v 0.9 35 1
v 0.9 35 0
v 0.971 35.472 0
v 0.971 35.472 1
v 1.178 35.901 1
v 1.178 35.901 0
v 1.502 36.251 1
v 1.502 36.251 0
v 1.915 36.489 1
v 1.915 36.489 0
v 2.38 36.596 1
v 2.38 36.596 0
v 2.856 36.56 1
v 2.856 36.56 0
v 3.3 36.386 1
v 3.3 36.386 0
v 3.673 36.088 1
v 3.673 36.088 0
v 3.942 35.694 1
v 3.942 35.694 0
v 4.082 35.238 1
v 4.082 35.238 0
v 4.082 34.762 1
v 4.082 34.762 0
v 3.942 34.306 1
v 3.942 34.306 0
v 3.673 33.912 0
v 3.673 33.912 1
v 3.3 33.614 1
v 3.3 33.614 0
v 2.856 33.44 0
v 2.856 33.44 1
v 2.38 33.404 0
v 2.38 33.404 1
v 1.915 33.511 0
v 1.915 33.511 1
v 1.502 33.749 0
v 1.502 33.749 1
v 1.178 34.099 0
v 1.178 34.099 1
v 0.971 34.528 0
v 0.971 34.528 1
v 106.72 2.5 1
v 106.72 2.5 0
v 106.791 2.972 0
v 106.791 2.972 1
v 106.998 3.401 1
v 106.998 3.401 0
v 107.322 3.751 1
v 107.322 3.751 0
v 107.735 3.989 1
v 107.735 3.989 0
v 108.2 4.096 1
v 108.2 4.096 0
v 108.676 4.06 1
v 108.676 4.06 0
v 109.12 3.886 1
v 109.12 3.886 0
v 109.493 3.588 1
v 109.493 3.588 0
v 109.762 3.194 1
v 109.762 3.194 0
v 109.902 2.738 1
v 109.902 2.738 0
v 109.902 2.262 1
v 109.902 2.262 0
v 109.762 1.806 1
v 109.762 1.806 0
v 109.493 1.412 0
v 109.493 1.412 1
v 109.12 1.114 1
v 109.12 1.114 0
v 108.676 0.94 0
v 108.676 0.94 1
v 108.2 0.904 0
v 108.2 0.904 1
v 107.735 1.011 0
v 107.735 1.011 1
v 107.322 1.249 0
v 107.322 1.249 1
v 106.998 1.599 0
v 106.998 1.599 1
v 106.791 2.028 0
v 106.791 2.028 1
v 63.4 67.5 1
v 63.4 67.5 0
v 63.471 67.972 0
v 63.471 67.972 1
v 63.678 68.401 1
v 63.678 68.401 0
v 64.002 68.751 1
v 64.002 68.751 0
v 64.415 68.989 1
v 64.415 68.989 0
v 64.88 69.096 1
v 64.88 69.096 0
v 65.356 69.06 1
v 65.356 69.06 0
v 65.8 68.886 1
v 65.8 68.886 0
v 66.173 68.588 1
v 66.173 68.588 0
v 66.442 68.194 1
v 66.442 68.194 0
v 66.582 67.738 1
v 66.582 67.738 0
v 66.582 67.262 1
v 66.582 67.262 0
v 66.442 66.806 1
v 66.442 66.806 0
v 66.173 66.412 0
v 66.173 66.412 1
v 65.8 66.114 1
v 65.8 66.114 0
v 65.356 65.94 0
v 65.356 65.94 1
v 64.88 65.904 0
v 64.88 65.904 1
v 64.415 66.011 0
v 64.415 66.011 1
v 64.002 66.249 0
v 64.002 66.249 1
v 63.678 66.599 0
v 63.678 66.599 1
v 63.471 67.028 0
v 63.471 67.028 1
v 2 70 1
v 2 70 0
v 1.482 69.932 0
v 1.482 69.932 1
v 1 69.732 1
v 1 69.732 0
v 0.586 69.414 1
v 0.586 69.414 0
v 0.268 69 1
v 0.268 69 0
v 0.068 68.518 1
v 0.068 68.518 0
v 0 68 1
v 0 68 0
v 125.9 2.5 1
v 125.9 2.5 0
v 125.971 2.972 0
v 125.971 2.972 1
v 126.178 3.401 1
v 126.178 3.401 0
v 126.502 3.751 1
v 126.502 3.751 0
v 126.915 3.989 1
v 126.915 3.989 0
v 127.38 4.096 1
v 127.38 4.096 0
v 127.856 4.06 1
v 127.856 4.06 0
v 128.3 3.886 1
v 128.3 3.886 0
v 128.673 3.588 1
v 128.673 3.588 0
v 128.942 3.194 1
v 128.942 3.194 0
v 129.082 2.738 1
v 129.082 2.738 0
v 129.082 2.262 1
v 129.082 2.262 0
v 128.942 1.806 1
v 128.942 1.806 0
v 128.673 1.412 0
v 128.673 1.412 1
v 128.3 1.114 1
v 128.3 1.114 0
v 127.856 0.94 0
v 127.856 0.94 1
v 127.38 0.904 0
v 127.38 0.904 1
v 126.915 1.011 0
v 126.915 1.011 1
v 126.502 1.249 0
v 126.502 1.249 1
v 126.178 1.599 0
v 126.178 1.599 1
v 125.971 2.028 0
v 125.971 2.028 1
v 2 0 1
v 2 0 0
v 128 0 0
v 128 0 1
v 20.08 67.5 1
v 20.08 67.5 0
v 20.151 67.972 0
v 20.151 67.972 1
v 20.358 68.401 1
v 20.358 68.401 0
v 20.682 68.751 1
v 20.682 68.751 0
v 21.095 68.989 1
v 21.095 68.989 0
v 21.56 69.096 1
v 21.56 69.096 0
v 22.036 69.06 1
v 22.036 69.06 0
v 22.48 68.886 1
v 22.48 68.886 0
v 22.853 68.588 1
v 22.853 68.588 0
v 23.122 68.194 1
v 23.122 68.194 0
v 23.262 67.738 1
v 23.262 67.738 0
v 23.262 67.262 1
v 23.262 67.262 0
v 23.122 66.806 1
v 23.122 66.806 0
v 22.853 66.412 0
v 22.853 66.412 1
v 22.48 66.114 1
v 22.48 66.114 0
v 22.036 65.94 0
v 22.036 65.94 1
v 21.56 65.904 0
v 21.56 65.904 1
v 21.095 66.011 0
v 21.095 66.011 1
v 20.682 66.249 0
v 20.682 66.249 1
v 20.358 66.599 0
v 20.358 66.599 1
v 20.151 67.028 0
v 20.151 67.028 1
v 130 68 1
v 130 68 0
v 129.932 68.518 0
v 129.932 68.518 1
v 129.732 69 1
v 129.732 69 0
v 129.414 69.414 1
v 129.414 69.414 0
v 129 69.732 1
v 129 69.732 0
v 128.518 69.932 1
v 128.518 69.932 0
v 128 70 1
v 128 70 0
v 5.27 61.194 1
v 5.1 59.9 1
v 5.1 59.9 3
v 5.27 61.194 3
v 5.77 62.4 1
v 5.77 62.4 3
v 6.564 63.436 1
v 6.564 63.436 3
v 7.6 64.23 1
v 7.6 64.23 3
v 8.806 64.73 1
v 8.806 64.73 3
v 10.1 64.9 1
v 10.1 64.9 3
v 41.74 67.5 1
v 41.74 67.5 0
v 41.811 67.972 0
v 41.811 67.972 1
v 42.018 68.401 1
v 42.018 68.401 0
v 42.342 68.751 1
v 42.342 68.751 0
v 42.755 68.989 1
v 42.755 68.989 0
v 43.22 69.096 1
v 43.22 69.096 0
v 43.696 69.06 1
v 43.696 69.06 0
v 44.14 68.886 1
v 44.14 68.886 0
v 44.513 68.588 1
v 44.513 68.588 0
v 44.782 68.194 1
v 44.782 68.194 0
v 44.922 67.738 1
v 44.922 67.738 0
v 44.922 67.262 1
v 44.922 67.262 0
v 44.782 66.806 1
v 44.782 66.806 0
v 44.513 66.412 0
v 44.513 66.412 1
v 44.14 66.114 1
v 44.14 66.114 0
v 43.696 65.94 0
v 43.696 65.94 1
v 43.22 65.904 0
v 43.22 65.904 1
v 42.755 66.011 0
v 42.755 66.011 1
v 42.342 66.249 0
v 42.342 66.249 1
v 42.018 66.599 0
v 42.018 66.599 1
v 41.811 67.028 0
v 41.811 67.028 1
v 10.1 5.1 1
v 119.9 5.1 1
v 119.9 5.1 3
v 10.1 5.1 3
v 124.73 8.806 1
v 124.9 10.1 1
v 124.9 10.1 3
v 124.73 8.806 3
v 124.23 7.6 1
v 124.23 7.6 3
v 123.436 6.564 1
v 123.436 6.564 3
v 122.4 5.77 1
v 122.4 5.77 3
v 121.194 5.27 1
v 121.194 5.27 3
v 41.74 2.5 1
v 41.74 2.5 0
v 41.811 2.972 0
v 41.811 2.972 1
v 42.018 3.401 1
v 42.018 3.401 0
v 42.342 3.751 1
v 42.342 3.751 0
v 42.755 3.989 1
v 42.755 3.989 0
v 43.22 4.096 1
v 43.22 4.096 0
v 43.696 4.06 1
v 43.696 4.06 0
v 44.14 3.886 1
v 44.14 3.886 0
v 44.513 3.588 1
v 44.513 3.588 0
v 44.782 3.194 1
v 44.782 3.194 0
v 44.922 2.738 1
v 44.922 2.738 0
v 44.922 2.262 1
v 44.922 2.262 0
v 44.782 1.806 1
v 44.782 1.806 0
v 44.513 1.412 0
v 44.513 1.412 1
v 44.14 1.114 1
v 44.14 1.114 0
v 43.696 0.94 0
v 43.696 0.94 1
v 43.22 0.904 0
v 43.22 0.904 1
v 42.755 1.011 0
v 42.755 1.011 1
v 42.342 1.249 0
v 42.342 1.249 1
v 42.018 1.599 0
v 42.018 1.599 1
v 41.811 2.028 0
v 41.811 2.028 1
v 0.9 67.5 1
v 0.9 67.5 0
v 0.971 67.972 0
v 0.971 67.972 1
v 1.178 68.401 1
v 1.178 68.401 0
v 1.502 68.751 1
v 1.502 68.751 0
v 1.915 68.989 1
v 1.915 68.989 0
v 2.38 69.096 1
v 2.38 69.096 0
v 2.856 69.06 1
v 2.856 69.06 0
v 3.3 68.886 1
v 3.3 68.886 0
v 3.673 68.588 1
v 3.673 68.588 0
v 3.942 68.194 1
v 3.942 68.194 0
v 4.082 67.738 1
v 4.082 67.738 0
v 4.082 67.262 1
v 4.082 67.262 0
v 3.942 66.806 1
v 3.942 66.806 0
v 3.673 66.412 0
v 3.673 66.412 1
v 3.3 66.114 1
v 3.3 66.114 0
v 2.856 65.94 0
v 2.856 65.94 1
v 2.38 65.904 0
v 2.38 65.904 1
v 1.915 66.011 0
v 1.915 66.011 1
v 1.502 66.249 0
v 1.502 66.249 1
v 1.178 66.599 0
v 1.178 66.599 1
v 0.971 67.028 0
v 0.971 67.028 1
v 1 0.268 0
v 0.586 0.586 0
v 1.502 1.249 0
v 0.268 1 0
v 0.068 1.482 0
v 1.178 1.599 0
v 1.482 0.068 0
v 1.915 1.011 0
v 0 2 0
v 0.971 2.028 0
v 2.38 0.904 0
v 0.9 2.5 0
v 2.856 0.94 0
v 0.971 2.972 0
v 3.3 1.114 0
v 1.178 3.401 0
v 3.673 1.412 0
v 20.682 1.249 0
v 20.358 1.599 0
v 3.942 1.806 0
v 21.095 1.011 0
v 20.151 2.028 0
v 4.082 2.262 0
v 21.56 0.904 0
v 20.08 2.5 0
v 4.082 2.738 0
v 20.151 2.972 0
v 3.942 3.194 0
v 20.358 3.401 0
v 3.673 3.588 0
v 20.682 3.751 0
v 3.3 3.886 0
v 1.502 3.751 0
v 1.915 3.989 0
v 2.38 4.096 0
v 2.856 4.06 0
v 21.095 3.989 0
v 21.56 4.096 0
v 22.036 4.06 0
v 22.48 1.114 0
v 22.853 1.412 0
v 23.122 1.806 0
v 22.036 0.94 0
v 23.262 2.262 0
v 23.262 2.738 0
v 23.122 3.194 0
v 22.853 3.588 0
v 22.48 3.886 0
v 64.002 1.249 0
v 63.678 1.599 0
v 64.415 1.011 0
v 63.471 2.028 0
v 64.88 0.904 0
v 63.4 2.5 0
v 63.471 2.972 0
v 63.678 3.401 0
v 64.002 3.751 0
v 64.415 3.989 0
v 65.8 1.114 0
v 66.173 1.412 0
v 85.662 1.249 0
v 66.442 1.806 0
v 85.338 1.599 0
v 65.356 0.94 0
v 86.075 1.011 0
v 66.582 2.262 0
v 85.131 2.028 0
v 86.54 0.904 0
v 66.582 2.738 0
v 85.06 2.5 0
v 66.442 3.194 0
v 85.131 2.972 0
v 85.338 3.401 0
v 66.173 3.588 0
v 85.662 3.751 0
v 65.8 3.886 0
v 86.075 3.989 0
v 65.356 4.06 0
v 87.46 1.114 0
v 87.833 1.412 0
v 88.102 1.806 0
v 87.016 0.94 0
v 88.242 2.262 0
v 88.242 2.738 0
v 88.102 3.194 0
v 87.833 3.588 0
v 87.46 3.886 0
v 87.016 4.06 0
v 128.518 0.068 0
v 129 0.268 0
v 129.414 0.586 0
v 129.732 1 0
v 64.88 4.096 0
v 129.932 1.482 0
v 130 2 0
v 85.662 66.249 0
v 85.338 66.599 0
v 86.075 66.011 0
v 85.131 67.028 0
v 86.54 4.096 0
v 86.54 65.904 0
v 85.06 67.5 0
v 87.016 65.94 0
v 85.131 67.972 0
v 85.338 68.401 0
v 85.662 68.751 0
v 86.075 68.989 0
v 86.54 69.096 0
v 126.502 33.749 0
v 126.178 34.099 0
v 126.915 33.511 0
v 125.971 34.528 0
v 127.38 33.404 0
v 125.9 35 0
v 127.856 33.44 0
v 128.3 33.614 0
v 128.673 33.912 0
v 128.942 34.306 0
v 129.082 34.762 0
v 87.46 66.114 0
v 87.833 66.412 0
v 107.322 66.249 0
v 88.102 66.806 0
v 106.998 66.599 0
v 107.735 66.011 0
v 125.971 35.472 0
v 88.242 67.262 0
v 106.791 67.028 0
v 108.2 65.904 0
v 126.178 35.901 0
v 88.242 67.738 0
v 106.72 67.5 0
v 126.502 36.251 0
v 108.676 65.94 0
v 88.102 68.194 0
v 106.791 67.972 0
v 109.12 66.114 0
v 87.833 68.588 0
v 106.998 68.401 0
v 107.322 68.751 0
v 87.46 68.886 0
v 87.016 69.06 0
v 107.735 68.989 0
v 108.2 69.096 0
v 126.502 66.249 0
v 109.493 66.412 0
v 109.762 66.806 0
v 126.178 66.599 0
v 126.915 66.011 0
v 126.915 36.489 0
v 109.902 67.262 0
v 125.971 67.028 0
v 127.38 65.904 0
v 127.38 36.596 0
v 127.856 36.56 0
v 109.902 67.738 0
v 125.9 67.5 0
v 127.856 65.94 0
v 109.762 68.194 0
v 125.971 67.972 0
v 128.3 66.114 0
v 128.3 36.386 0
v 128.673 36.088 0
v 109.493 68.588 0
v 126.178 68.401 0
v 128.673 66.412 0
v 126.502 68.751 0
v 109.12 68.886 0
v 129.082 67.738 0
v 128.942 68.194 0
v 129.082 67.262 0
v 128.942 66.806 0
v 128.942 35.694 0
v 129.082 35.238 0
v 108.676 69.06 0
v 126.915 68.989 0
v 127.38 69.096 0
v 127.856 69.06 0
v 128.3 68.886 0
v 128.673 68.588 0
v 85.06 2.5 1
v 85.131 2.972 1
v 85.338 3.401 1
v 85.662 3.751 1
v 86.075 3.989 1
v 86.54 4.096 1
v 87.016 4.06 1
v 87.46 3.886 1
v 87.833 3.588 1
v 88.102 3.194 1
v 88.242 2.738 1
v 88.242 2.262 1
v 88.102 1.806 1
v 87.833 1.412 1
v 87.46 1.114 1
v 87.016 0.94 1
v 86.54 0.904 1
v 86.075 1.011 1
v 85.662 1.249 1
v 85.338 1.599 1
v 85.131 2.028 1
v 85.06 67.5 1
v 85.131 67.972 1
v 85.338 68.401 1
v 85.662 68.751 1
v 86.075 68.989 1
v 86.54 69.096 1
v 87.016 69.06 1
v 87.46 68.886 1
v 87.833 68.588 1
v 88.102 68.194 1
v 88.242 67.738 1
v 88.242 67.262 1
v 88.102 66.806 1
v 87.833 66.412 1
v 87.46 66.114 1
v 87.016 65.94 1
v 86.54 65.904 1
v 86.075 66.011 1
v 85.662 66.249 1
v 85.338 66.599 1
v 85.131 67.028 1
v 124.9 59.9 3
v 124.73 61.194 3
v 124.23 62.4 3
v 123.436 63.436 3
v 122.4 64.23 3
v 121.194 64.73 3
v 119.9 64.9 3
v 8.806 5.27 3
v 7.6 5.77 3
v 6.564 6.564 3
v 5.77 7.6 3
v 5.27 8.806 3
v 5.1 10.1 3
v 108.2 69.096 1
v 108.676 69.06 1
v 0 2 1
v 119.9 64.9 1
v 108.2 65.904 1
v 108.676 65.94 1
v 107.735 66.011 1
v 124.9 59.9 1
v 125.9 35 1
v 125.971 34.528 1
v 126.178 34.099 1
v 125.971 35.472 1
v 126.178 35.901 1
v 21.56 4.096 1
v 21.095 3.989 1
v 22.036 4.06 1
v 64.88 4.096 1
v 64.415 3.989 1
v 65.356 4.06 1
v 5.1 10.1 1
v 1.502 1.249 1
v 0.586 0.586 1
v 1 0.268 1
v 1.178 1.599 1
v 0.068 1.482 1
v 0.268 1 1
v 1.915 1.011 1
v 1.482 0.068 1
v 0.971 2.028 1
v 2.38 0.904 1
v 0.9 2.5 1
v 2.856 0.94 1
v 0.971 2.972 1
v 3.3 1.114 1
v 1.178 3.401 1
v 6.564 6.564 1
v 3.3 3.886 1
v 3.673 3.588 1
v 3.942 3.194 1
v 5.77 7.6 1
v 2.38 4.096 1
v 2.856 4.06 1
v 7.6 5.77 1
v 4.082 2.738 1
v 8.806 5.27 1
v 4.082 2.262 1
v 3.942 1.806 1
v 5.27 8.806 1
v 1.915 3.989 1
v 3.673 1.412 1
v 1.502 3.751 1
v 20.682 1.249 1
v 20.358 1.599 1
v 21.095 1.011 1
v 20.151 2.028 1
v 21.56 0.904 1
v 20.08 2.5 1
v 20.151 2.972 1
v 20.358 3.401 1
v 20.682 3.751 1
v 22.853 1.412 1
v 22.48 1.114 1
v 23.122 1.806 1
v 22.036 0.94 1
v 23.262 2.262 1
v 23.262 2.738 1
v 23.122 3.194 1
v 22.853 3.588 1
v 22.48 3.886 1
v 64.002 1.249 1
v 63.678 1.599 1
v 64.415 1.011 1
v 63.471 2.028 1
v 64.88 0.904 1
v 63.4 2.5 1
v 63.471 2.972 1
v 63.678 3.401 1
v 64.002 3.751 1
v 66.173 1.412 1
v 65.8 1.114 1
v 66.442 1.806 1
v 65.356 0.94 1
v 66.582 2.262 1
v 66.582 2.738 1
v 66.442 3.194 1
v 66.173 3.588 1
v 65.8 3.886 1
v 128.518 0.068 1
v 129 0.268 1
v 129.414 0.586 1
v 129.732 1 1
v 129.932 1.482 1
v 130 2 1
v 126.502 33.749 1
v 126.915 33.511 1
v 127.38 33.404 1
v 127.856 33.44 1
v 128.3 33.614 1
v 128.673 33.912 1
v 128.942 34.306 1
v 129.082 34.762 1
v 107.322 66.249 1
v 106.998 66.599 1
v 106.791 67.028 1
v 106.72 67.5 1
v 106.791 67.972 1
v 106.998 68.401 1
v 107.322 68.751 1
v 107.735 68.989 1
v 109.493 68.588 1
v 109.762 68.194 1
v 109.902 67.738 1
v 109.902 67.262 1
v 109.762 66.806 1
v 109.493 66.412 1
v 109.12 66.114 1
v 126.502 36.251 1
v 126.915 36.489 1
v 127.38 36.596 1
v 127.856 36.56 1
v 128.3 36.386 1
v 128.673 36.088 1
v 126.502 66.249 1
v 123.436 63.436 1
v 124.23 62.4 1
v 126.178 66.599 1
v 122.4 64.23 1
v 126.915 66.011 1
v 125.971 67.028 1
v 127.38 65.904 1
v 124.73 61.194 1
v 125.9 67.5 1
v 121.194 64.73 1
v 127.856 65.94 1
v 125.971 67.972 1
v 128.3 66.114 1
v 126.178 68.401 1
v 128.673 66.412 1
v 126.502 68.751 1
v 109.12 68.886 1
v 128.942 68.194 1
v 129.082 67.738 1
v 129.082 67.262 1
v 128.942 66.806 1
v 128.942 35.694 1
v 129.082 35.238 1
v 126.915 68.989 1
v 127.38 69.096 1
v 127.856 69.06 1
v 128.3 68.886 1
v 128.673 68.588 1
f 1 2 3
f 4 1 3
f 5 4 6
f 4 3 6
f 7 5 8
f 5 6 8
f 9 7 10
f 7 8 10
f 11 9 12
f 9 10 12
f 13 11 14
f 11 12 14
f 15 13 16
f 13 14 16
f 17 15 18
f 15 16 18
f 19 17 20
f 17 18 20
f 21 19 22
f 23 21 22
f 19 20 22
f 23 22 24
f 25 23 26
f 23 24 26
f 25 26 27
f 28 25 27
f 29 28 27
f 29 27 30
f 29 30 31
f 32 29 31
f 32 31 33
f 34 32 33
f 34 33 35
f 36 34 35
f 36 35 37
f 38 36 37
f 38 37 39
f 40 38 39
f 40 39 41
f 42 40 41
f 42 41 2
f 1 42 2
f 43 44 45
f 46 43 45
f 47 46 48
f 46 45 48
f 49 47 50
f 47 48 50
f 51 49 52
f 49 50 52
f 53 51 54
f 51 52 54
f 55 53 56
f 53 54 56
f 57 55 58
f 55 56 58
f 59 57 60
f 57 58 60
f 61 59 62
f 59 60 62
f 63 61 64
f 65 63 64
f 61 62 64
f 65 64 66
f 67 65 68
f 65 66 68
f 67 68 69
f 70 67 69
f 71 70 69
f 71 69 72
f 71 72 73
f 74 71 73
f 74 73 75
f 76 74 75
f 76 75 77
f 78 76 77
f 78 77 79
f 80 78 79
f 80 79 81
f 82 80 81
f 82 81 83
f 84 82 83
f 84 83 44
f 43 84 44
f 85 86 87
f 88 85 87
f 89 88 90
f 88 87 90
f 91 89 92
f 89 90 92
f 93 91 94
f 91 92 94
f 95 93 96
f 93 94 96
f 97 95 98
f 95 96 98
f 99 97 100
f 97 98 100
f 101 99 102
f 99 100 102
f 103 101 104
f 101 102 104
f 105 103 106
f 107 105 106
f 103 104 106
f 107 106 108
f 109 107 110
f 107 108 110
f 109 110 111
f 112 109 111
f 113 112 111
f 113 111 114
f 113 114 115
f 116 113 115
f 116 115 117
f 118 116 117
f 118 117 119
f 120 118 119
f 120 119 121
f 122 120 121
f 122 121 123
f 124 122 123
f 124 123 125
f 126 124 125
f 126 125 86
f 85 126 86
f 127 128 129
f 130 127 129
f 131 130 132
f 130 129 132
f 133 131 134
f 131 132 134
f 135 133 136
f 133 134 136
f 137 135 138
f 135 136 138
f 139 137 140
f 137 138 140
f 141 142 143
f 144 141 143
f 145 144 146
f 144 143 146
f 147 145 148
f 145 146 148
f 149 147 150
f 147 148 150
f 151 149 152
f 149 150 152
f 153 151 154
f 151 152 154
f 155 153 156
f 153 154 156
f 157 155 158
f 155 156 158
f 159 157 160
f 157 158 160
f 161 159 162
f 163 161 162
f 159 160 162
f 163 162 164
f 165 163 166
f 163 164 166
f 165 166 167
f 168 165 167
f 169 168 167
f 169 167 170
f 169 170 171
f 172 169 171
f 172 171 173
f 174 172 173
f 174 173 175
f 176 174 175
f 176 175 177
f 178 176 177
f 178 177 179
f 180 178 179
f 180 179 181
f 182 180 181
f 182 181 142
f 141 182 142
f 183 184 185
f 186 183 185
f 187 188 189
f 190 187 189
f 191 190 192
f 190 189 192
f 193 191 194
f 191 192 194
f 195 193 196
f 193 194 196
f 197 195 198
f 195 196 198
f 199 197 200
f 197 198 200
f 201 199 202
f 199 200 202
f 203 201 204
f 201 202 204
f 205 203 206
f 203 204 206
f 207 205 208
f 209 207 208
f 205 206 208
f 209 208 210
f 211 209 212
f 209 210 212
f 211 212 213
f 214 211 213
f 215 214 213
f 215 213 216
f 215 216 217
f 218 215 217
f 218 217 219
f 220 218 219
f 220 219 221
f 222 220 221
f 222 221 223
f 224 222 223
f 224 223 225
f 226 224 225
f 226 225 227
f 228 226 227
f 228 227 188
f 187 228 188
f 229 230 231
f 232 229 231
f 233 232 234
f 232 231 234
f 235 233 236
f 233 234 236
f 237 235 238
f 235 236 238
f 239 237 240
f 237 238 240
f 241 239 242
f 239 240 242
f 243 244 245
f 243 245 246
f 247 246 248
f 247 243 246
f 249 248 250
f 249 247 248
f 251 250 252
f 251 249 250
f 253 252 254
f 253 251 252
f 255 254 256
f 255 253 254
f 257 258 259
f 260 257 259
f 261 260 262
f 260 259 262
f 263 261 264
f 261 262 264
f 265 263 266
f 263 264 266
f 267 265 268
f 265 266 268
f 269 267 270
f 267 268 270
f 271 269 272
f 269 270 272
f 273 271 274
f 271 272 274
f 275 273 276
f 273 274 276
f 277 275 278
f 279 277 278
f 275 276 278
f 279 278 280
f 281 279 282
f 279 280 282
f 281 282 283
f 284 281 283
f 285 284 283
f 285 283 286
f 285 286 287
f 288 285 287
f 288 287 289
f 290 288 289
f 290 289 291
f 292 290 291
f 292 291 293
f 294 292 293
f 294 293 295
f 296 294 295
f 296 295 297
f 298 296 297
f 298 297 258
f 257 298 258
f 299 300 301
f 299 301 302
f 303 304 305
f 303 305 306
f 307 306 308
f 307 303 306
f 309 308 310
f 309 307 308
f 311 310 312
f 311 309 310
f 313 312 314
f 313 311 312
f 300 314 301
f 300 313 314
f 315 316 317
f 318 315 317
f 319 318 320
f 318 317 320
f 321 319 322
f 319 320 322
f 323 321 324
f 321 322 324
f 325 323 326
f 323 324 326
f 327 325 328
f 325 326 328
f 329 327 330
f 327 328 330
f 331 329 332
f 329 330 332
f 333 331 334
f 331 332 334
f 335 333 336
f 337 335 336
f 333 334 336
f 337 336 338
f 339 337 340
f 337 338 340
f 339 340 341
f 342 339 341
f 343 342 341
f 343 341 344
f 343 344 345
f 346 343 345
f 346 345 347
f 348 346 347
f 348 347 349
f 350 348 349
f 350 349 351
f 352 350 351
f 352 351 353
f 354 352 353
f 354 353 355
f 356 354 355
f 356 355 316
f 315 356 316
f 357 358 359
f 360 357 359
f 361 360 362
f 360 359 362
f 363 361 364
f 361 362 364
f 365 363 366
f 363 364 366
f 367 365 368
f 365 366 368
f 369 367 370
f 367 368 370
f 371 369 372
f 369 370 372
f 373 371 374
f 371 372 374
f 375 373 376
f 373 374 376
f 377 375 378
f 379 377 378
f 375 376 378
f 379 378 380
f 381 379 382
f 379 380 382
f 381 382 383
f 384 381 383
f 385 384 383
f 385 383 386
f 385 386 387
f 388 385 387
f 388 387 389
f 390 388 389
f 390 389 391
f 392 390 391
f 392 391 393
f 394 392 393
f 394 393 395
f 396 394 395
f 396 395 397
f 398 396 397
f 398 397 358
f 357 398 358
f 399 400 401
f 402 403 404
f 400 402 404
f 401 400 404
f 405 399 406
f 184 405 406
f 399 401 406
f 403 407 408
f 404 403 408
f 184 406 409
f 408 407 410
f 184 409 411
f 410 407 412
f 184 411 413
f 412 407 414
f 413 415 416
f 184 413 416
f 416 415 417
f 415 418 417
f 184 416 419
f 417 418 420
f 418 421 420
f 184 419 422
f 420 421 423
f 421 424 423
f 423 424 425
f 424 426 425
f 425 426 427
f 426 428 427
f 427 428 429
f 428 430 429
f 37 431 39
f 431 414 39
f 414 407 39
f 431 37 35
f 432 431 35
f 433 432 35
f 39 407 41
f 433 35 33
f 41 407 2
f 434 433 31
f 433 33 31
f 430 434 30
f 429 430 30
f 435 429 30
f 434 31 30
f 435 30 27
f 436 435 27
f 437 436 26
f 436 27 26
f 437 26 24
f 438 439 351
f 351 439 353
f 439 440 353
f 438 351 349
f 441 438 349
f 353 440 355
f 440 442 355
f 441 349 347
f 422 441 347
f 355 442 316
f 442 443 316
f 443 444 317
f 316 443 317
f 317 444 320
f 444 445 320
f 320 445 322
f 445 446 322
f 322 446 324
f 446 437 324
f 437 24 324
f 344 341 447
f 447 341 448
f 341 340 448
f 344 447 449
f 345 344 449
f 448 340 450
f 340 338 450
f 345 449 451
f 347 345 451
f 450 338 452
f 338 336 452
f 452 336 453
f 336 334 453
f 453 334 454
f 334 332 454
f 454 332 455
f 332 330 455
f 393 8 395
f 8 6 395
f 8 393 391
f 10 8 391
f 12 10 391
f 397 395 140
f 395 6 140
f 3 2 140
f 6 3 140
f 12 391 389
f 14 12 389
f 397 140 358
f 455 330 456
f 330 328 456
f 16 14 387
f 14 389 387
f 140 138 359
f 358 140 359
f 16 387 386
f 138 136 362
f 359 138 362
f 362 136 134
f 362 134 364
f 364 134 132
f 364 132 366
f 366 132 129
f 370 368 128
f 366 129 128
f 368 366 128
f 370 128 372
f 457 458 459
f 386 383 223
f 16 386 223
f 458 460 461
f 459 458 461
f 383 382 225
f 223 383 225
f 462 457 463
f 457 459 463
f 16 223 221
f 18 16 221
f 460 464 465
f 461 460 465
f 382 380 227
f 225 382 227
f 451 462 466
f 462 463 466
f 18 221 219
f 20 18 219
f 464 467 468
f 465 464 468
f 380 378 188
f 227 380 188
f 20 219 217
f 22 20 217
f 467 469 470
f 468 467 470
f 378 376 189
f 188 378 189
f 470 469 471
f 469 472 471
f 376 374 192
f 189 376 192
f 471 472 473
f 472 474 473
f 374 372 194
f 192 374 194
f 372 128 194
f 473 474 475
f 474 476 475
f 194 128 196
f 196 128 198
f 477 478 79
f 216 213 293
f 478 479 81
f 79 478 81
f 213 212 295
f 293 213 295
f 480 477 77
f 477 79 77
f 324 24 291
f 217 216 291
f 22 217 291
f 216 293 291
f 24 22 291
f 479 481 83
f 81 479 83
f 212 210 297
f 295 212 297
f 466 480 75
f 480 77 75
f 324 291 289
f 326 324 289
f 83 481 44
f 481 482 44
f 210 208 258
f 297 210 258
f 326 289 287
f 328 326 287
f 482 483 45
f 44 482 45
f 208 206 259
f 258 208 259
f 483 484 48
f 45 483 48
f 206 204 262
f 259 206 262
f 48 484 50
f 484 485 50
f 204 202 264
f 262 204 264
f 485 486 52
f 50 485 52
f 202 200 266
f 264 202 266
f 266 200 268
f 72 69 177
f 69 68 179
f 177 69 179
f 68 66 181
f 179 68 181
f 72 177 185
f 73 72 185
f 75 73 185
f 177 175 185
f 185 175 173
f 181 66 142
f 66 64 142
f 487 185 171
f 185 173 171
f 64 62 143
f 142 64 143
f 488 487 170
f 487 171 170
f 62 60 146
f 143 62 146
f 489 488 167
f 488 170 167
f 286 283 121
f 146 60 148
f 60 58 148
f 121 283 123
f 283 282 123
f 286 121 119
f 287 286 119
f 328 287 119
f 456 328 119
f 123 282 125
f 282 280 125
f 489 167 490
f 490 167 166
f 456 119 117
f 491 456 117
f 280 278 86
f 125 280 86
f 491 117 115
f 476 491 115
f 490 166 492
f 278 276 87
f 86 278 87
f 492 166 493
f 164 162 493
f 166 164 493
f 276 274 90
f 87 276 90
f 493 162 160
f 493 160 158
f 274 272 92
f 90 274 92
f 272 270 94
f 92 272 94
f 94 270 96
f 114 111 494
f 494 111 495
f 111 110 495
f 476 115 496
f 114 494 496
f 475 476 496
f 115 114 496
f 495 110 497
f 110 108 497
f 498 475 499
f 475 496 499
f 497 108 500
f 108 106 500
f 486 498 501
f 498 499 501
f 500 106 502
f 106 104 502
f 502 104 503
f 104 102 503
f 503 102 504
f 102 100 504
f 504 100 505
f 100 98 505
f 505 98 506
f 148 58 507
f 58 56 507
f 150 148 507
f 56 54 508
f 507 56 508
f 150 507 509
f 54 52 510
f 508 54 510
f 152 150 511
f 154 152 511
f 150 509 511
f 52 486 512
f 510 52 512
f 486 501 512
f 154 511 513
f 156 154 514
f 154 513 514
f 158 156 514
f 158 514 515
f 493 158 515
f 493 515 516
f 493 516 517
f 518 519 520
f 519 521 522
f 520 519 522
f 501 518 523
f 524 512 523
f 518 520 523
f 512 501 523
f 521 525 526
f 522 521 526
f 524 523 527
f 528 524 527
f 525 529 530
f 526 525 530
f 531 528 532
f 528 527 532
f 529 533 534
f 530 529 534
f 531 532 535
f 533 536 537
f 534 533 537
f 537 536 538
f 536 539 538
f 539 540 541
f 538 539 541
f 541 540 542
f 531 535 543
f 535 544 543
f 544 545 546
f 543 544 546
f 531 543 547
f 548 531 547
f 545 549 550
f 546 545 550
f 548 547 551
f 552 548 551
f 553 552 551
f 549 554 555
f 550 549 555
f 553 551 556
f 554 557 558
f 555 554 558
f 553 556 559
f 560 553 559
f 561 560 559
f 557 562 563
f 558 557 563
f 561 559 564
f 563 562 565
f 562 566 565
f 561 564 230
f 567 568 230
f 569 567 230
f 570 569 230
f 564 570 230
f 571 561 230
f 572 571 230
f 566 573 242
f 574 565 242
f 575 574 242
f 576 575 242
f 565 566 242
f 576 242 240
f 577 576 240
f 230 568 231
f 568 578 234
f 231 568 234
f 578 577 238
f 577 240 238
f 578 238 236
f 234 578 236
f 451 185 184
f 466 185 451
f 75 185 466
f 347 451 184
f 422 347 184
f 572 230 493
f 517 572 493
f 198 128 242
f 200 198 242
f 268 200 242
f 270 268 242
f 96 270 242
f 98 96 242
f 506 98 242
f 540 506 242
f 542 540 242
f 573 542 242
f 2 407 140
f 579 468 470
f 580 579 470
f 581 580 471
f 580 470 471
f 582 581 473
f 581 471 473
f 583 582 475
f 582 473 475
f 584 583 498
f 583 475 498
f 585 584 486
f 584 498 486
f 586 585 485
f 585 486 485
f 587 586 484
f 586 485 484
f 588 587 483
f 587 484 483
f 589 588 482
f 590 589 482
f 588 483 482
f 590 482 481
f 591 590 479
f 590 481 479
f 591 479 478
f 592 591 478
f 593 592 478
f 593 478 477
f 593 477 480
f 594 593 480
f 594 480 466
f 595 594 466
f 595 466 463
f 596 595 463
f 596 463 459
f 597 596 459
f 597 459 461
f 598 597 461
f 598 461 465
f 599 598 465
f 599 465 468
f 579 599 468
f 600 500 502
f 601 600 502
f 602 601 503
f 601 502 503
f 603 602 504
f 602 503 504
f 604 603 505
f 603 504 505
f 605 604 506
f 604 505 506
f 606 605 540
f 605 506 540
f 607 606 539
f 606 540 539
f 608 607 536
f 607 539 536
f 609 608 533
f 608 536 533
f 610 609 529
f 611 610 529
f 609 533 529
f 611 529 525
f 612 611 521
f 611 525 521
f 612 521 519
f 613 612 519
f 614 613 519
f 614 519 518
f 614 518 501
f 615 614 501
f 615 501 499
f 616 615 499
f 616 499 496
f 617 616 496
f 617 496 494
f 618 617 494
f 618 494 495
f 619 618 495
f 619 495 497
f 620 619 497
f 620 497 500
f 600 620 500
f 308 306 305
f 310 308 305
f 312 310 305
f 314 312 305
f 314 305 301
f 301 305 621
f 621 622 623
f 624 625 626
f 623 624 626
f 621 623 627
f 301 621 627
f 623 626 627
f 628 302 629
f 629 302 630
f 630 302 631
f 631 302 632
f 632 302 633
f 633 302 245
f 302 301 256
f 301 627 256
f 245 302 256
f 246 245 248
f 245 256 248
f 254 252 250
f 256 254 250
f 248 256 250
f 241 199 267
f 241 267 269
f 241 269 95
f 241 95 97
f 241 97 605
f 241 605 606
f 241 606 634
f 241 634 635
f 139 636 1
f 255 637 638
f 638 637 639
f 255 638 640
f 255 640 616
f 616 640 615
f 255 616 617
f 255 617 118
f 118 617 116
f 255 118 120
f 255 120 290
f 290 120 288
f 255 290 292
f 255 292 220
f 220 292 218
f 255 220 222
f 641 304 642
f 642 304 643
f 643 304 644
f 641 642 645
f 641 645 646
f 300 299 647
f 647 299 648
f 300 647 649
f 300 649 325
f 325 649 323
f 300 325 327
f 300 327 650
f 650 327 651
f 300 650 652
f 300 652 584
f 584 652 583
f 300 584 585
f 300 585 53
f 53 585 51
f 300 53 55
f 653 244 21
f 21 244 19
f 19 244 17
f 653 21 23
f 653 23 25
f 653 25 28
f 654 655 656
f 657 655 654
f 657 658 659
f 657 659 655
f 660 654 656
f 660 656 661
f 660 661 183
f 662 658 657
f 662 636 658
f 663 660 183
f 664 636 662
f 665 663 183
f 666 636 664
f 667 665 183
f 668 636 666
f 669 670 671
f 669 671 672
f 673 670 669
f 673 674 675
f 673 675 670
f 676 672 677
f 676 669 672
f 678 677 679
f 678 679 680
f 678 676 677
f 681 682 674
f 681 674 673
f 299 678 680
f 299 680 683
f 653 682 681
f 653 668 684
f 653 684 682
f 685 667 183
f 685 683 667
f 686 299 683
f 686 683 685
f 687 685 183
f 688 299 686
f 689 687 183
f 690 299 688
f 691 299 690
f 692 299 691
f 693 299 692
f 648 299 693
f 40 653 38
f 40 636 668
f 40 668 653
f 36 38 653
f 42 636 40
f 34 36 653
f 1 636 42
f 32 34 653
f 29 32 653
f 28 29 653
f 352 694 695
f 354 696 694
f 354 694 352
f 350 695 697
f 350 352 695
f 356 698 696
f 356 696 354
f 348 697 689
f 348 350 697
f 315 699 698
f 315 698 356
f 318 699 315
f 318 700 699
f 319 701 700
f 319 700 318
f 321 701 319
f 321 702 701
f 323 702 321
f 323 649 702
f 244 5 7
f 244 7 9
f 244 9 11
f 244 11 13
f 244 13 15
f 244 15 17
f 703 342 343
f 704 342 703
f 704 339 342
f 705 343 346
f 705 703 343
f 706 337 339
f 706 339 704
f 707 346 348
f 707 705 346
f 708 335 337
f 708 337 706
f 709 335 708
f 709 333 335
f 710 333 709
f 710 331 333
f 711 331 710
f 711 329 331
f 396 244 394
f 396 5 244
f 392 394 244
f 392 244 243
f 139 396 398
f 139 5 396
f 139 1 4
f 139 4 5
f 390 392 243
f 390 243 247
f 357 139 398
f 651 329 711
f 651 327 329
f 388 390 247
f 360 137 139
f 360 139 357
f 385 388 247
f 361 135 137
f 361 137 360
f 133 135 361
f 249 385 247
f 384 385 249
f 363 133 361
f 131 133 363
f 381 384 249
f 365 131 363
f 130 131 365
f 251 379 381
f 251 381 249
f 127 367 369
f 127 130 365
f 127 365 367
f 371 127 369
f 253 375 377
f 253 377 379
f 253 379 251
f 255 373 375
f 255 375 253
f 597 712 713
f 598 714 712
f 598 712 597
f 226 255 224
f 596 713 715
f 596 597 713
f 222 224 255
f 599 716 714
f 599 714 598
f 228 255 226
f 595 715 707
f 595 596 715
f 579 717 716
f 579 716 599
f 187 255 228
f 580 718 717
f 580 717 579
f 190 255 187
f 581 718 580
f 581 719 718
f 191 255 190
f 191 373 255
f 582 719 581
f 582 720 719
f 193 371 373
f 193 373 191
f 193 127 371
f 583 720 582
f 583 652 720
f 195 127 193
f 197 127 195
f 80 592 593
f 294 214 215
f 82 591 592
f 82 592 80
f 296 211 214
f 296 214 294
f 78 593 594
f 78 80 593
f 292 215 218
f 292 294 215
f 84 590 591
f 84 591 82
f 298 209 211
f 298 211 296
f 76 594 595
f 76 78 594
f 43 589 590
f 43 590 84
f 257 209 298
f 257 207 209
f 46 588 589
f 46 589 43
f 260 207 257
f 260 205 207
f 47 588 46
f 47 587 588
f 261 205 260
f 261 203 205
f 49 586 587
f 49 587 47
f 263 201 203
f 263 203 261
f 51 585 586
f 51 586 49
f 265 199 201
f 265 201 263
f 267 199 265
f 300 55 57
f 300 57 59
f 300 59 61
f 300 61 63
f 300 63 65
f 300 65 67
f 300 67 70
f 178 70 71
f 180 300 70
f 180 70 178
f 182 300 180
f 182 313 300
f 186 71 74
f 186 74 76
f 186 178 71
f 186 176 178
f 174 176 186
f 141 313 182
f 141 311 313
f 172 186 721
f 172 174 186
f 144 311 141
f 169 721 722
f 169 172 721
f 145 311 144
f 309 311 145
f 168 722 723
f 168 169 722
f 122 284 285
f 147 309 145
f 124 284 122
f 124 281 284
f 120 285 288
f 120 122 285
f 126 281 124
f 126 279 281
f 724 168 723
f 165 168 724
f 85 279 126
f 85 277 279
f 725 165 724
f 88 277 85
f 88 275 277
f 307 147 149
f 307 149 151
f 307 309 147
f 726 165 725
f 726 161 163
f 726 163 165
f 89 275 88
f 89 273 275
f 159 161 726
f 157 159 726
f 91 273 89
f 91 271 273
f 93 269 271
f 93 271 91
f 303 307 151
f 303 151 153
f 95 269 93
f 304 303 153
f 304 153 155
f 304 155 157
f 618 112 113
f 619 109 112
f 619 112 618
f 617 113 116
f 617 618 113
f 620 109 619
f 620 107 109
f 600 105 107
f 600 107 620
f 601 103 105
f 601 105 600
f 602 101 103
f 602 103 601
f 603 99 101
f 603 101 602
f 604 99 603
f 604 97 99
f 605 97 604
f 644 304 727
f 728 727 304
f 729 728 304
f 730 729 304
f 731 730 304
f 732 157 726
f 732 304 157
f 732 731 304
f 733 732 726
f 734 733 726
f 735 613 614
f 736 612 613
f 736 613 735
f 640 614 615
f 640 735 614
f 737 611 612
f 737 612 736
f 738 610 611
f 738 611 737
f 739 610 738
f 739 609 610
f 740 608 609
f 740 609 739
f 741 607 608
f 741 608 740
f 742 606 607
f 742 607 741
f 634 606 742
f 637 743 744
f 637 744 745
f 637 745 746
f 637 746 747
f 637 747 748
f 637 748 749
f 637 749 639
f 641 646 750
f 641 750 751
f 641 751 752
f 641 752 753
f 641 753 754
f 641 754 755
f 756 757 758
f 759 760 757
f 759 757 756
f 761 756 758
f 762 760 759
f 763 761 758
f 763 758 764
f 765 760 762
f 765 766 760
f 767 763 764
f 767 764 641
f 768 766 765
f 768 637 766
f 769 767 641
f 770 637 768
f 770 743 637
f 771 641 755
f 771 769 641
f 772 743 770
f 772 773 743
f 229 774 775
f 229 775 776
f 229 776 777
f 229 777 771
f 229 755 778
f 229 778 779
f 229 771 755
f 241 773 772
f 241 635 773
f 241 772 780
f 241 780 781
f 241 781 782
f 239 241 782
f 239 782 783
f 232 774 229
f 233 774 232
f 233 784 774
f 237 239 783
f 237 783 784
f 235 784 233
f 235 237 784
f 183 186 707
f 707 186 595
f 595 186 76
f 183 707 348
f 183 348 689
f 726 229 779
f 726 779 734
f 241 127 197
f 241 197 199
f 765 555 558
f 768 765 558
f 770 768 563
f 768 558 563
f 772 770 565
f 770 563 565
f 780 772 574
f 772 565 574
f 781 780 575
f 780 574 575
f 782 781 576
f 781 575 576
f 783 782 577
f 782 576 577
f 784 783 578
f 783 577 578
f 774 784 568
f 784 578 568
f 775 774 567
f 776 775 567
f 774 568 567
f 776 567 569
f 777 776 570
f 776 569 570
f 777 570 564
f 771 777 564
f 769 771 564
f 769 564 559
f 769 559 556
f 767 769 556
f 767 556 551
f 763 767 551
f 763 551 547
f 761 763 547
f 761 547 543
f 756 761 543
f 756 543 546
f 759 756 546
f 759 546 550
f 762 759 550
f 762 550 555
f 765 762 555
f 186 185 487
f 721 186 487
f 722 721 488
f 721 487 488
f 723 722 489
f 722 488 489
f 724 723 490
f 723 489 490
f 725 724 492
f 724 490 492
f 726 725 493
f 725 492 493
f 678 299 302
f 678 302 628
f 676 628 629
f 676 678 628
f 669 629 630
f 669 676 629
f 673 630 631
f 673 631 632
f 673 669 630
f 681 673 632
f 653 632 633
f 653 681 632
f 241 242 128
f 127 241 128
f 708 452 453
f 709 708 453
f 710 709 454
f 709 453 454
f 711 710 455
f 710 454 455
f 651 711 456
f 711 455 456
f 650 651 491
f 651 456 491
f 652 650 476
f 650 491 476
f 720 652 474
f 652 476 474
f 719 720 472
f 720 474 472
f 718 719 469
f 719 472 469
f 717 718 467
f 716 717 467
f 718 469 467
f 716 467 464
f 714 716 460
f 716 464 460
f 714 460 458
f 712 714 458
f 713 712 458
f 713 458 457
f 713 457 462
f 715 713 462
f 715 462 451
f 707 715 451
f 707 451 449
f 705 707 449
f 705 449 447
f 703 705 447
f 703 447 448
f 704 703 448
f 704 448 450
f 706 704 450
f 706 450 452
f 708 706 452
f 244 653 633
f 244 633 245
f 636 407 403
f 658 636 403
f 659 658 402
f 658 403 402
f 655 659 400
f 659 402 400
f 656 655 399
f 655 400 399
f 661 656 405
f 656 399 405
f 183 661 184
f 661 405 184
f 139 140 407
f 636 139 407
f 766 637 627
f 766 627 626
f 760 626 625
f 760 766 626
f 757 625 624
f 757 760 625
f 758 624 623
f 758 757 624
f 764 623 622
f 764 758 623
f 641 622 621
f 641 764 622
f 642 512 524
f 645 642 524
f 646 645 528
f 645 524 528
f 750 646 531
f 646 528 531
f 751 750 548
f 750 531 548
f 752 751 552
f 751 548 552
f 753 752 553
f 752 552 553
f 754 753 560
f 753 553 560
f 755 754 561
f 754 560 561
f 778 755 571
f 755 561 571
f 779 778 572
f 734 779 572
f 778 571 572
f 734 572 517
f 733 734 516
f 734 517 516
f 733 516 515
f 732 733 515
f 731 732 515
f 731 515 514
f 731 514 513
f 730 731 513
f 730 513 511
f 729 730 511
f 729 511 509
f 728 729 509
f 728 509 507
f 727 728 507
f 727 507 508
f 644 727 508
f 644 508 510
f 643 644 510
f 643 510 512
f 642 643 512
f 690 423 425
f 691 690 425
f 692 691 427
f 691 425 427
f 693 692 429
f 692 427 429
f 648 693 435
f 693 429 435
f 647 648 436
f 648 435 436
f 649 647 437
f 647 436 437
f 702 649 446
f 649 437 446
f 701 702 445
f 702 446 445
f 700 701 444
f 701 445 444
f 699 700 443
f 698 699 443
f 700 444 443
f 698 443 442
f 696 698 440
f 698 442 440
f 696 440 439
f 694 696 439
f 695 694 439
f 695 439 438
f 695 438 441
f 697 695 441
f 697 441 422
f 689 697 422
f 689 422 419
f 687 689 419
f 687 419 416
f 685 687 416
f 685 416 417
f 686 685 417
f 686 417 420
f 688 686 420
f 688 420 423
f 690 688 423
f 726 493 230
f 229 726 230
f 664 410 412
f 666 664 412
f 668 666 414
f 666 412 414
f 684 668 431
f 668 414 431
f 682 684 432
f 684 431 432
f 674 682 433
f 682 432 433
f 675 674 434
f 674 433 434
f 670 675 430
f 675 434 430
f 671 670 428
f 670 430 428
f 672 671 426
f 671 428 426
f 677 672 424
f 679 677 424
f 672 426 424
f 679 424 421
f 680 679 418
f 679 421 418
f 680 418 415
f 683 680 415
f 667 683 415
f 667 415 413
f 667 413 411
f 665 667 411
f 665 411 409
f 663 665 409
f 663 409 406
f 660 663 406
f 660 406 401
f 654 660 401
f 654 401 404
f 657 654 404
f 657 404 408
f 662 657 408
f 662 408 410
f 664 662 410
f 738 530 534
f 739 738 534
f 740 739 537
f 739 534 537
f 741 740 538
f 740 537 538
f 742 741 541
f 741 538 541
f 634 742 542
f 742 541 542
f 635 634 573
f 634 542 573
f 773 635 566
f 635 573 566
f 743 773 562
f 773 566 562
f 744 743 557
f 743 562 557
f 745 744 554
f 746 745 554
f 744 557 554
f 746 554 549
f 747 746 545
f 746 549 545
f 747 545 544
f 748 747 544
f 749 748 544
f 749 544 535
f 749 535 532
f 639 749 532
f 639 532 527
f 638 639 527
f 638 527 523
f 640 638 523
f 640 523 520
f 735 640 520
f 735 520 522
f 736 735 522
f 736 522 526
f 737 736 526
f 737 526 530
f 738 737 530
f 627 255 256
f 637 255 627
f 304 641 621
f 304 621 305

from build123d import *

# Parameters (mm, degrees)
BOSS_EXTRU_1_DEPTH      = 1
BOSS_EXTRU_2_DEPTH      = 2
ENL_V_MAT_EXTRU_1_REACH = 5
ESQUISSE3_R             = 1.6


with BuildPart() as part:
    # Esquisse1 → Boss.-Extru.1 (new body)
    with BuildSketch(Plane.XY):
        with BuildLine():
            Line((2, 0), (128, 0))
            ThreePointArc((128, 0), (129.414213562, 0.585786438), (130, 2))
            Line((130, 2), (130, 68))
            ThreePointArc((130, 68), (129.414213562, 69.414213562), (128, 70))
            Line((128, 70), (2, 70))
            ThreePointArc((2, 70), (0.585786438, 69.414213562), (0, 68))
            Line((0, 68), (0, 2))
            ThreePointArc((0, 2), (0.585786438, 0.585786438), (2, 0))
        make_face()
    extrude(amount=BOSS_EXTRU_1_DEPTH)

    # Esquisse2 → Boss.-Extru.2 (add)
    with BuildSketch(Plane.XY.offset(1)):
        with BuildLine():
            Line((10.1, 64.9), (119.9, 64.9))
            ThreePointArc((119.9, 64.9), (123.435533906, 63.435533906), (124.9, 59.9))
            Line((124.9, 59.9), (124.9, 10.1))
            ThreePointArc((124.9, 10.1), (123.435533906, 6.564466094), (119.9, 5.1))
            Line((119.9, 5.1), (10.1, 5.1))
            ThreePointArc((10.1, 5.1), (6.564466094, 6.564466094), (5.1, 10.1))
            Line((5.1, 10.1), (5.1, 59.9))
            ThreePointArc((5.1, 59.9), (6.564466094, 63.435533906), (10.1, 64.9))
        make_face()
    extrude(amount=BOSS_EXTRU_2_DEPTH)

    # Esquisse3 → Enlèv. mat.-Extru.1 (cut, up to next)
    with BuildSketch(Plane(origin=(0, 0, 0), x_dir=(-1, 0, 0), z_dir=(0, 0, -1)), mode=Mode.PRIVATE) as enl_v_mat_extru_1_sk1:
        with Locations((-65, 67.5)):
            Circle(ESQUISSE3_R)
    enl_v_mat_extru_1_tool1 = extrude(enl_v_mat_extru_1_sk1.sketch, amount=-ENL_V_MAT_EXTRU_1_REACH, mode=Mode.PRIVATE) & part.part
    add(enl_v_mat_extru_1_tool1.solids().sort_by_distance((65, 67.5, 0))[0], mode=Mode.SUBTRACT)
    # Esquisse3 → Enlèv. mat.-Extru.1 (cut, up to next)
    with BuildSketch(Plane(origin=(0, 0, 0), x_dir=(-1, 0, 0), z_dir=(0, 0, -1)), mode=Mode.PRIVATE) as enl_v_mat_extru_1_sk2:
        with Locations((-43.34, 67.5)):
            Circle(ESQUISSE3_R)
    enl_v_mat_extru_1_tool2 = extrude(enl_v_mat_extru_1_sk2.sketch, amount=-ENL_V_MAT_EXTRU_1_REACH, mode=Mode.PRIVATE) & part.part
    add(enl_v_mat_extru_1_tool2.solids().sort_by_distance((43.34, 67.5, 0))[0], mode=Mode.SUBTRACT)
    # Esquisse3 → Enlèv. mat.-Extru.1 (cut, up to next)
    with BuildSketch(Plane(origin=(0, 0, 0), x_dir=(-1, 0, 0), z_dir=(0, 0, -1)), mode=Mode.PRIVATE) as enl_v_mat_extru_1_sk3:
        with Locations((-21.68, 67.5)):
            Circle(ESQUISSE3_R)
    enl_v_mat_extru_1_tool3 = extrude(enl_v_mat_extru_1_sk3.sketch, amount=-ENL_V_MAT_EXTRU_1_REACH, mode=Mode.PRIVATE) & part.part
    add(enl_v_mat_extru_1_tool3.solids().sort_by_distance((21.68, 67.5, 0))[0], mode=Mode.SUBTRACT)
    # Esquisse3 → Enlèv. mat.-Extru.1 (cut, up to next)
    with BuildSketch(Plane(origin=(0, 0, 0), x_dir=(-1, 0, 0), z_dir=(0, 0, -1)), mode=Mode.PRIVATE) as enl_v_mat_extru_1_sk4:
        with Locations((-2.5, 67.5)):
            Circle(ESQUISSE3_R)
    enl_v_mat_extru_1_tool4 = extrude(enl_v_mat_extru_1_sk4.sketch, amount=-ENL_V_MAT_EXTRU_1_REACH, mode=Mode.PRIVATE) & part.part
    add(enl_v_mat_extru_1_tool4.solids().sort_by_distance((2.5, 67.5, 0))[0], mode=Mode.SUBTRACT)
    # Esquisse3 → Enlèv. mat.-Extru.1 (cut, up to next)
    with BuildSketch(Plane(origin=(0, 0, 0), x_dir=(-1, 0, 0), z_dir=(0, 0, -1)), mode=Mode.PRIVATE) as enl_v_mat_extru_1_sk5:
        with Locations((-2.5, 2.5)):
            Circle(ESQUISSE3_R)
    enl_v_mat_extru_1_tool5 = extrude(enl_v_mat_extru_1_sk5.sketch, amount=-ENL_V_MAT_EXTRU_1_REACH, mode=Mode.PRIVATE) & part.part
    add(enl_v_mat_extru_1_tool5.solids().sort_by_distance((2.5, 2.5, 0))[0], mode=Mode.SUBTRACT)
    # Esquisse3 → Enlèv. mat.-Extru.1 (cut, up to next)
    with BuildSketch(Plane(origin=(0, 0, 0), x_dir=(-1, 0, 0), z_dir=(0, 0, -1)), mode=Mode.PRIVATE) as enl_v_mat_extru_1_sk6:
        with Locations((-21.68, 2.5)):
            Circle(ESQUISSE3_R)
    enl_v_mat_extru_1_tool6 = extrude(enl_v_mat_extru_1_sk6.sketch, amount=-ENL_V_MAT_EXTRU_1_REACH, mode=Mode.PRIVATE) & part.part
    add(enl_v_mat_extru_1_tool6.solids().sort_by_distance((21.68, 2.5, 0))[0], mode=Mode.SUBTRACT)
    # Esquisse3 → Enlèv. mat.-Extru.1 (cut, up to next)
    with BuildSketch(Plane(origin=(0, 0, 0), x_dir=(-1, 0, 0), z_dir=(0, 0, -1)), mode=Mode.PRIVATE) as enl_v_mat_extru_1_sk7:
        with Locations((-43.34, 2.5)):
            Circle(ESQUISSE3_R)
    enl_v_mat_extru_1_tool7 = extrude(enl_v_mat_extru_1_sk7.sketch, amount=-ENL_V_MAT_EXTRU_1_REACH, mode=Mode.PRIVATE) & part.part
    add(enl_v_mat_extru_1_tool7.solids().sort_by_distance((43.34, 2.5, 0))[0], mode=Mode.SUBTRACT)
    # Esquisse3 → Enlèv. mat.-Extru.1 (cut, up to next)
    with BuildSketch(Plane(origin=(0, 0, 0), x_dir=(-1, 0, 0), z_dir=(0, 0, -1)), mode=Mode.PRIVATE) as enl_v_mat_extru_1_sk8:
        with Locations((-65, 2.5)):
            Circle(ESQUISSE3_R)
    enl_v_mat_extru_1_tool8 = extrude(enl_v_mat_extru_1_sk8.sketch, amount=-ENL_V_MAT_EXTRU_1_REACH, mode=Mode.PRIVATE) & part.part
    add(enl_v_mat_extru_1_tool8.solids().sort_by_distance((65, 2.5, 0))[0], mode=Mode.SUBTRACT)
    # Esquisse3 → Enlèv. mat.-Extru.1 (cut, up to next)
    with BuildSketch(Plane(origin=(0, 0, 0), x_dir=(-1, 0, 0), z_dir=(0, 0, -1)), mode=Mode.PRIVATE) as enl_v_mat_extru_1_sk9:
        with Locations((-86.66, 2.5)):
            Circle(ESQUISSE3_R)
    enl_v_mat_extru_1_tool9 = extrude(enl_v_mat_extru_1_sk9.sketch, amount=-ENL_V_MAT_EXTRU_1_REACH, mode=Mode.PRIVATE) & part.part
    add(enl_v_mat_extru_1_tool9.solids().sort_by_distance((86.66, 2.5, 0))[0], mode=Mode.SUBTRACT)
    # Esquisse3 → Enlèv. mat.-Extru.1 (cut, up to next)
    with BuildSketch(Plane(origin=(0, 0, 0), x_dir=(-1, 0, 0), z_dir=(0, 0, -1)), mode=Mode.PRIVATE) as enl_v_mat_extru_1_sk10:
        with Locations((-108.32, 2.5)):
            Circle(ESQUISSE3_R)
    enl_v_mat_extru_1_tool10 = extrude(enl_v_mat_extru_1_sk10.sketch, amount=-ENL_V_MAT_EXTRU_1_REACH, mode=Mode.PRIVATE) & part.part
    add(enl_v_mat_extru_1_tool10.solids().sort_by_distance((108.32, 2.5, 0))[0], mode=Mode.SUBTRACT)
    # Esquisse3 → Enlèv. mat.-Extru.1 (cut, up to next)
    with BuildSketch(Plane(origin=(0, 0, 0), x_dir=(-1, 0, 0), z_dir=(0, 0, -1)), mode=Mode.PRIVATE) as enl_v_mat_extru_1_sk11:
        with Locations((-127.5, 2.5)):
            Circle(ESQUISSE3_R)
    enl_v_mat_extru_1_tool11 = extrude(enl_v_mat_extru_1_sk11.sketch, amount=-ENL_V_MAT_EXTRU_1_REACH, mode=Mode.PRIVATE) & part.part
    add(enl_v_mat_extru_1_tool11.solids().sort_by_distance((127.5, 2.5, 0))[0], mode=Mode.SUBTRACT)
    # Esquisse3 → Enlèv. mat.-Extru.1 (cut, up to next)
    with BuildSketch(Plane(origin=(0, 0, 0), x_dir=(-1, 0, 0), z_dir=(0, 0, -1)), mode=Mode.PRIVATE) as enl_v_mat_extru_1_sk12:
        with Locations((-127.5, 67.5)):
            Circle(ESQUISSE3_R)
    enl_v_mat_extru_1_tool12 = extrude(enl_v_mat_extru_1_sk12.sketch, amount=-ENL_V_MAT_EXTRU_1_REACH, mode=Mode.PRIVATE) & part.part
    add(enl_v_mat_extru_1_tool12.solids().sort_by_distance((127.5, 67.5, 0))[0], mode=Mode.SUBTRACT)
    # Esquisse3 → Enlèv. mat.-Extru.1 (cut, up to next)
    with BuildSketch(Plane(origin=(0, 0, 0), x_dir=(-1, 0, 0), z_dir=(0, 0, -1)), mode=Mode.PRIVATE) as enl_v_mat_extru_1_sk13:
        with Locations((-108.32, 67.5)):
            Circle(ESQUISSE3_R)
    enl_v_mat_extru_1_tool13 = extrude(enl_v_mat_extru_1_sk13.sketch, amount=-ENL_V_MAT_EXTRU_1_REACH, mode=Mode.PRIVATE) & part.part
    add(enl_v_mat_extru_1_tool13.solids().sort_by_distance((108.32, 67.5, 0))[0], mode=Mode.SUBTRACT)
    # Esquisse3 → Enlèv. mat.-Extru.1 (cut, up to next)
    with BuildSketch(Plane(origin=(0, 0, 0), x_dir=(-1, 0, 0), z_dir=(0, 0, -1)), mode=Mode.PRIVATE) as enl_v_mat_extru_1_sk14:
        with Locations((-86.66, 67.5)):
            Circle(ESQUISSE3_R)
    enl_v_mat_extru_1_tool14 = extrude(enl_v_mat_extru_1_sk14.sketch, amount=-ENL_V_MAT_EXTRU_1_REACH, mode=Mode.PRIVATE) & part.part
    add(enl_v_mat_extru_1_tool14.solids().sort_by_distance((86.66, 67.5, 0))[0], mode=Mode.SUBTRACT)
    # Esquisse3 → Enlèv. mat.-Extru.1 (cut, up to next)
    with BuildSketch(Plane(origin=(0, 0, 0), x_dir=(-1, 0, 0), z_dir=(0, 0, -1)), mode=Mode.PRIVATE) as enl_v_mat_extru_1_sk15:
        with Locations((-2.5, 35)):
            Circle(ESQUISSE3_R)
    enl_v_mat_extru_1_tool15 = extrude(enl_v_mat_extru_1_sk15.sketch, amount=-ENL_V_MAT_EXTRU_1_REACH, mode=Mode.PRIVATE) & part.part
    add(enl_v_mat_extru_1_tool15.solids().sort_by_distance((2.5, 35, 0))[0], mode=Mode.SUBTRACT)
    # Esquisse3 → Enlèv. mat.-Extru.1 (cut, up to next)
    with BuildSketch(Plane(origin=(0, 0, 0), x_dir=(-1, 0, 0), z_dir=(0, 0, -1)), mode=Mode.PRIVATE) as enl_v_mat_extru_1_sk16:
        with Locations((-127.5, 35)):
            Circle(ESQUISSE3_R)
    enl_v_mat_extru_1_tool16 = extrude(enl_v_mat_extru_1_sk16.sketch, amount=-ENL_V_MAT_EXTRU_1_REACH, mode=Mode.PRIVATE) & part.part
    add(enl_v_mat_extru_1_tool16.solids().sort_by_distance((127.5, 35, 0))[0], mode=Mode.SUBTRACT)


solid = part.part
